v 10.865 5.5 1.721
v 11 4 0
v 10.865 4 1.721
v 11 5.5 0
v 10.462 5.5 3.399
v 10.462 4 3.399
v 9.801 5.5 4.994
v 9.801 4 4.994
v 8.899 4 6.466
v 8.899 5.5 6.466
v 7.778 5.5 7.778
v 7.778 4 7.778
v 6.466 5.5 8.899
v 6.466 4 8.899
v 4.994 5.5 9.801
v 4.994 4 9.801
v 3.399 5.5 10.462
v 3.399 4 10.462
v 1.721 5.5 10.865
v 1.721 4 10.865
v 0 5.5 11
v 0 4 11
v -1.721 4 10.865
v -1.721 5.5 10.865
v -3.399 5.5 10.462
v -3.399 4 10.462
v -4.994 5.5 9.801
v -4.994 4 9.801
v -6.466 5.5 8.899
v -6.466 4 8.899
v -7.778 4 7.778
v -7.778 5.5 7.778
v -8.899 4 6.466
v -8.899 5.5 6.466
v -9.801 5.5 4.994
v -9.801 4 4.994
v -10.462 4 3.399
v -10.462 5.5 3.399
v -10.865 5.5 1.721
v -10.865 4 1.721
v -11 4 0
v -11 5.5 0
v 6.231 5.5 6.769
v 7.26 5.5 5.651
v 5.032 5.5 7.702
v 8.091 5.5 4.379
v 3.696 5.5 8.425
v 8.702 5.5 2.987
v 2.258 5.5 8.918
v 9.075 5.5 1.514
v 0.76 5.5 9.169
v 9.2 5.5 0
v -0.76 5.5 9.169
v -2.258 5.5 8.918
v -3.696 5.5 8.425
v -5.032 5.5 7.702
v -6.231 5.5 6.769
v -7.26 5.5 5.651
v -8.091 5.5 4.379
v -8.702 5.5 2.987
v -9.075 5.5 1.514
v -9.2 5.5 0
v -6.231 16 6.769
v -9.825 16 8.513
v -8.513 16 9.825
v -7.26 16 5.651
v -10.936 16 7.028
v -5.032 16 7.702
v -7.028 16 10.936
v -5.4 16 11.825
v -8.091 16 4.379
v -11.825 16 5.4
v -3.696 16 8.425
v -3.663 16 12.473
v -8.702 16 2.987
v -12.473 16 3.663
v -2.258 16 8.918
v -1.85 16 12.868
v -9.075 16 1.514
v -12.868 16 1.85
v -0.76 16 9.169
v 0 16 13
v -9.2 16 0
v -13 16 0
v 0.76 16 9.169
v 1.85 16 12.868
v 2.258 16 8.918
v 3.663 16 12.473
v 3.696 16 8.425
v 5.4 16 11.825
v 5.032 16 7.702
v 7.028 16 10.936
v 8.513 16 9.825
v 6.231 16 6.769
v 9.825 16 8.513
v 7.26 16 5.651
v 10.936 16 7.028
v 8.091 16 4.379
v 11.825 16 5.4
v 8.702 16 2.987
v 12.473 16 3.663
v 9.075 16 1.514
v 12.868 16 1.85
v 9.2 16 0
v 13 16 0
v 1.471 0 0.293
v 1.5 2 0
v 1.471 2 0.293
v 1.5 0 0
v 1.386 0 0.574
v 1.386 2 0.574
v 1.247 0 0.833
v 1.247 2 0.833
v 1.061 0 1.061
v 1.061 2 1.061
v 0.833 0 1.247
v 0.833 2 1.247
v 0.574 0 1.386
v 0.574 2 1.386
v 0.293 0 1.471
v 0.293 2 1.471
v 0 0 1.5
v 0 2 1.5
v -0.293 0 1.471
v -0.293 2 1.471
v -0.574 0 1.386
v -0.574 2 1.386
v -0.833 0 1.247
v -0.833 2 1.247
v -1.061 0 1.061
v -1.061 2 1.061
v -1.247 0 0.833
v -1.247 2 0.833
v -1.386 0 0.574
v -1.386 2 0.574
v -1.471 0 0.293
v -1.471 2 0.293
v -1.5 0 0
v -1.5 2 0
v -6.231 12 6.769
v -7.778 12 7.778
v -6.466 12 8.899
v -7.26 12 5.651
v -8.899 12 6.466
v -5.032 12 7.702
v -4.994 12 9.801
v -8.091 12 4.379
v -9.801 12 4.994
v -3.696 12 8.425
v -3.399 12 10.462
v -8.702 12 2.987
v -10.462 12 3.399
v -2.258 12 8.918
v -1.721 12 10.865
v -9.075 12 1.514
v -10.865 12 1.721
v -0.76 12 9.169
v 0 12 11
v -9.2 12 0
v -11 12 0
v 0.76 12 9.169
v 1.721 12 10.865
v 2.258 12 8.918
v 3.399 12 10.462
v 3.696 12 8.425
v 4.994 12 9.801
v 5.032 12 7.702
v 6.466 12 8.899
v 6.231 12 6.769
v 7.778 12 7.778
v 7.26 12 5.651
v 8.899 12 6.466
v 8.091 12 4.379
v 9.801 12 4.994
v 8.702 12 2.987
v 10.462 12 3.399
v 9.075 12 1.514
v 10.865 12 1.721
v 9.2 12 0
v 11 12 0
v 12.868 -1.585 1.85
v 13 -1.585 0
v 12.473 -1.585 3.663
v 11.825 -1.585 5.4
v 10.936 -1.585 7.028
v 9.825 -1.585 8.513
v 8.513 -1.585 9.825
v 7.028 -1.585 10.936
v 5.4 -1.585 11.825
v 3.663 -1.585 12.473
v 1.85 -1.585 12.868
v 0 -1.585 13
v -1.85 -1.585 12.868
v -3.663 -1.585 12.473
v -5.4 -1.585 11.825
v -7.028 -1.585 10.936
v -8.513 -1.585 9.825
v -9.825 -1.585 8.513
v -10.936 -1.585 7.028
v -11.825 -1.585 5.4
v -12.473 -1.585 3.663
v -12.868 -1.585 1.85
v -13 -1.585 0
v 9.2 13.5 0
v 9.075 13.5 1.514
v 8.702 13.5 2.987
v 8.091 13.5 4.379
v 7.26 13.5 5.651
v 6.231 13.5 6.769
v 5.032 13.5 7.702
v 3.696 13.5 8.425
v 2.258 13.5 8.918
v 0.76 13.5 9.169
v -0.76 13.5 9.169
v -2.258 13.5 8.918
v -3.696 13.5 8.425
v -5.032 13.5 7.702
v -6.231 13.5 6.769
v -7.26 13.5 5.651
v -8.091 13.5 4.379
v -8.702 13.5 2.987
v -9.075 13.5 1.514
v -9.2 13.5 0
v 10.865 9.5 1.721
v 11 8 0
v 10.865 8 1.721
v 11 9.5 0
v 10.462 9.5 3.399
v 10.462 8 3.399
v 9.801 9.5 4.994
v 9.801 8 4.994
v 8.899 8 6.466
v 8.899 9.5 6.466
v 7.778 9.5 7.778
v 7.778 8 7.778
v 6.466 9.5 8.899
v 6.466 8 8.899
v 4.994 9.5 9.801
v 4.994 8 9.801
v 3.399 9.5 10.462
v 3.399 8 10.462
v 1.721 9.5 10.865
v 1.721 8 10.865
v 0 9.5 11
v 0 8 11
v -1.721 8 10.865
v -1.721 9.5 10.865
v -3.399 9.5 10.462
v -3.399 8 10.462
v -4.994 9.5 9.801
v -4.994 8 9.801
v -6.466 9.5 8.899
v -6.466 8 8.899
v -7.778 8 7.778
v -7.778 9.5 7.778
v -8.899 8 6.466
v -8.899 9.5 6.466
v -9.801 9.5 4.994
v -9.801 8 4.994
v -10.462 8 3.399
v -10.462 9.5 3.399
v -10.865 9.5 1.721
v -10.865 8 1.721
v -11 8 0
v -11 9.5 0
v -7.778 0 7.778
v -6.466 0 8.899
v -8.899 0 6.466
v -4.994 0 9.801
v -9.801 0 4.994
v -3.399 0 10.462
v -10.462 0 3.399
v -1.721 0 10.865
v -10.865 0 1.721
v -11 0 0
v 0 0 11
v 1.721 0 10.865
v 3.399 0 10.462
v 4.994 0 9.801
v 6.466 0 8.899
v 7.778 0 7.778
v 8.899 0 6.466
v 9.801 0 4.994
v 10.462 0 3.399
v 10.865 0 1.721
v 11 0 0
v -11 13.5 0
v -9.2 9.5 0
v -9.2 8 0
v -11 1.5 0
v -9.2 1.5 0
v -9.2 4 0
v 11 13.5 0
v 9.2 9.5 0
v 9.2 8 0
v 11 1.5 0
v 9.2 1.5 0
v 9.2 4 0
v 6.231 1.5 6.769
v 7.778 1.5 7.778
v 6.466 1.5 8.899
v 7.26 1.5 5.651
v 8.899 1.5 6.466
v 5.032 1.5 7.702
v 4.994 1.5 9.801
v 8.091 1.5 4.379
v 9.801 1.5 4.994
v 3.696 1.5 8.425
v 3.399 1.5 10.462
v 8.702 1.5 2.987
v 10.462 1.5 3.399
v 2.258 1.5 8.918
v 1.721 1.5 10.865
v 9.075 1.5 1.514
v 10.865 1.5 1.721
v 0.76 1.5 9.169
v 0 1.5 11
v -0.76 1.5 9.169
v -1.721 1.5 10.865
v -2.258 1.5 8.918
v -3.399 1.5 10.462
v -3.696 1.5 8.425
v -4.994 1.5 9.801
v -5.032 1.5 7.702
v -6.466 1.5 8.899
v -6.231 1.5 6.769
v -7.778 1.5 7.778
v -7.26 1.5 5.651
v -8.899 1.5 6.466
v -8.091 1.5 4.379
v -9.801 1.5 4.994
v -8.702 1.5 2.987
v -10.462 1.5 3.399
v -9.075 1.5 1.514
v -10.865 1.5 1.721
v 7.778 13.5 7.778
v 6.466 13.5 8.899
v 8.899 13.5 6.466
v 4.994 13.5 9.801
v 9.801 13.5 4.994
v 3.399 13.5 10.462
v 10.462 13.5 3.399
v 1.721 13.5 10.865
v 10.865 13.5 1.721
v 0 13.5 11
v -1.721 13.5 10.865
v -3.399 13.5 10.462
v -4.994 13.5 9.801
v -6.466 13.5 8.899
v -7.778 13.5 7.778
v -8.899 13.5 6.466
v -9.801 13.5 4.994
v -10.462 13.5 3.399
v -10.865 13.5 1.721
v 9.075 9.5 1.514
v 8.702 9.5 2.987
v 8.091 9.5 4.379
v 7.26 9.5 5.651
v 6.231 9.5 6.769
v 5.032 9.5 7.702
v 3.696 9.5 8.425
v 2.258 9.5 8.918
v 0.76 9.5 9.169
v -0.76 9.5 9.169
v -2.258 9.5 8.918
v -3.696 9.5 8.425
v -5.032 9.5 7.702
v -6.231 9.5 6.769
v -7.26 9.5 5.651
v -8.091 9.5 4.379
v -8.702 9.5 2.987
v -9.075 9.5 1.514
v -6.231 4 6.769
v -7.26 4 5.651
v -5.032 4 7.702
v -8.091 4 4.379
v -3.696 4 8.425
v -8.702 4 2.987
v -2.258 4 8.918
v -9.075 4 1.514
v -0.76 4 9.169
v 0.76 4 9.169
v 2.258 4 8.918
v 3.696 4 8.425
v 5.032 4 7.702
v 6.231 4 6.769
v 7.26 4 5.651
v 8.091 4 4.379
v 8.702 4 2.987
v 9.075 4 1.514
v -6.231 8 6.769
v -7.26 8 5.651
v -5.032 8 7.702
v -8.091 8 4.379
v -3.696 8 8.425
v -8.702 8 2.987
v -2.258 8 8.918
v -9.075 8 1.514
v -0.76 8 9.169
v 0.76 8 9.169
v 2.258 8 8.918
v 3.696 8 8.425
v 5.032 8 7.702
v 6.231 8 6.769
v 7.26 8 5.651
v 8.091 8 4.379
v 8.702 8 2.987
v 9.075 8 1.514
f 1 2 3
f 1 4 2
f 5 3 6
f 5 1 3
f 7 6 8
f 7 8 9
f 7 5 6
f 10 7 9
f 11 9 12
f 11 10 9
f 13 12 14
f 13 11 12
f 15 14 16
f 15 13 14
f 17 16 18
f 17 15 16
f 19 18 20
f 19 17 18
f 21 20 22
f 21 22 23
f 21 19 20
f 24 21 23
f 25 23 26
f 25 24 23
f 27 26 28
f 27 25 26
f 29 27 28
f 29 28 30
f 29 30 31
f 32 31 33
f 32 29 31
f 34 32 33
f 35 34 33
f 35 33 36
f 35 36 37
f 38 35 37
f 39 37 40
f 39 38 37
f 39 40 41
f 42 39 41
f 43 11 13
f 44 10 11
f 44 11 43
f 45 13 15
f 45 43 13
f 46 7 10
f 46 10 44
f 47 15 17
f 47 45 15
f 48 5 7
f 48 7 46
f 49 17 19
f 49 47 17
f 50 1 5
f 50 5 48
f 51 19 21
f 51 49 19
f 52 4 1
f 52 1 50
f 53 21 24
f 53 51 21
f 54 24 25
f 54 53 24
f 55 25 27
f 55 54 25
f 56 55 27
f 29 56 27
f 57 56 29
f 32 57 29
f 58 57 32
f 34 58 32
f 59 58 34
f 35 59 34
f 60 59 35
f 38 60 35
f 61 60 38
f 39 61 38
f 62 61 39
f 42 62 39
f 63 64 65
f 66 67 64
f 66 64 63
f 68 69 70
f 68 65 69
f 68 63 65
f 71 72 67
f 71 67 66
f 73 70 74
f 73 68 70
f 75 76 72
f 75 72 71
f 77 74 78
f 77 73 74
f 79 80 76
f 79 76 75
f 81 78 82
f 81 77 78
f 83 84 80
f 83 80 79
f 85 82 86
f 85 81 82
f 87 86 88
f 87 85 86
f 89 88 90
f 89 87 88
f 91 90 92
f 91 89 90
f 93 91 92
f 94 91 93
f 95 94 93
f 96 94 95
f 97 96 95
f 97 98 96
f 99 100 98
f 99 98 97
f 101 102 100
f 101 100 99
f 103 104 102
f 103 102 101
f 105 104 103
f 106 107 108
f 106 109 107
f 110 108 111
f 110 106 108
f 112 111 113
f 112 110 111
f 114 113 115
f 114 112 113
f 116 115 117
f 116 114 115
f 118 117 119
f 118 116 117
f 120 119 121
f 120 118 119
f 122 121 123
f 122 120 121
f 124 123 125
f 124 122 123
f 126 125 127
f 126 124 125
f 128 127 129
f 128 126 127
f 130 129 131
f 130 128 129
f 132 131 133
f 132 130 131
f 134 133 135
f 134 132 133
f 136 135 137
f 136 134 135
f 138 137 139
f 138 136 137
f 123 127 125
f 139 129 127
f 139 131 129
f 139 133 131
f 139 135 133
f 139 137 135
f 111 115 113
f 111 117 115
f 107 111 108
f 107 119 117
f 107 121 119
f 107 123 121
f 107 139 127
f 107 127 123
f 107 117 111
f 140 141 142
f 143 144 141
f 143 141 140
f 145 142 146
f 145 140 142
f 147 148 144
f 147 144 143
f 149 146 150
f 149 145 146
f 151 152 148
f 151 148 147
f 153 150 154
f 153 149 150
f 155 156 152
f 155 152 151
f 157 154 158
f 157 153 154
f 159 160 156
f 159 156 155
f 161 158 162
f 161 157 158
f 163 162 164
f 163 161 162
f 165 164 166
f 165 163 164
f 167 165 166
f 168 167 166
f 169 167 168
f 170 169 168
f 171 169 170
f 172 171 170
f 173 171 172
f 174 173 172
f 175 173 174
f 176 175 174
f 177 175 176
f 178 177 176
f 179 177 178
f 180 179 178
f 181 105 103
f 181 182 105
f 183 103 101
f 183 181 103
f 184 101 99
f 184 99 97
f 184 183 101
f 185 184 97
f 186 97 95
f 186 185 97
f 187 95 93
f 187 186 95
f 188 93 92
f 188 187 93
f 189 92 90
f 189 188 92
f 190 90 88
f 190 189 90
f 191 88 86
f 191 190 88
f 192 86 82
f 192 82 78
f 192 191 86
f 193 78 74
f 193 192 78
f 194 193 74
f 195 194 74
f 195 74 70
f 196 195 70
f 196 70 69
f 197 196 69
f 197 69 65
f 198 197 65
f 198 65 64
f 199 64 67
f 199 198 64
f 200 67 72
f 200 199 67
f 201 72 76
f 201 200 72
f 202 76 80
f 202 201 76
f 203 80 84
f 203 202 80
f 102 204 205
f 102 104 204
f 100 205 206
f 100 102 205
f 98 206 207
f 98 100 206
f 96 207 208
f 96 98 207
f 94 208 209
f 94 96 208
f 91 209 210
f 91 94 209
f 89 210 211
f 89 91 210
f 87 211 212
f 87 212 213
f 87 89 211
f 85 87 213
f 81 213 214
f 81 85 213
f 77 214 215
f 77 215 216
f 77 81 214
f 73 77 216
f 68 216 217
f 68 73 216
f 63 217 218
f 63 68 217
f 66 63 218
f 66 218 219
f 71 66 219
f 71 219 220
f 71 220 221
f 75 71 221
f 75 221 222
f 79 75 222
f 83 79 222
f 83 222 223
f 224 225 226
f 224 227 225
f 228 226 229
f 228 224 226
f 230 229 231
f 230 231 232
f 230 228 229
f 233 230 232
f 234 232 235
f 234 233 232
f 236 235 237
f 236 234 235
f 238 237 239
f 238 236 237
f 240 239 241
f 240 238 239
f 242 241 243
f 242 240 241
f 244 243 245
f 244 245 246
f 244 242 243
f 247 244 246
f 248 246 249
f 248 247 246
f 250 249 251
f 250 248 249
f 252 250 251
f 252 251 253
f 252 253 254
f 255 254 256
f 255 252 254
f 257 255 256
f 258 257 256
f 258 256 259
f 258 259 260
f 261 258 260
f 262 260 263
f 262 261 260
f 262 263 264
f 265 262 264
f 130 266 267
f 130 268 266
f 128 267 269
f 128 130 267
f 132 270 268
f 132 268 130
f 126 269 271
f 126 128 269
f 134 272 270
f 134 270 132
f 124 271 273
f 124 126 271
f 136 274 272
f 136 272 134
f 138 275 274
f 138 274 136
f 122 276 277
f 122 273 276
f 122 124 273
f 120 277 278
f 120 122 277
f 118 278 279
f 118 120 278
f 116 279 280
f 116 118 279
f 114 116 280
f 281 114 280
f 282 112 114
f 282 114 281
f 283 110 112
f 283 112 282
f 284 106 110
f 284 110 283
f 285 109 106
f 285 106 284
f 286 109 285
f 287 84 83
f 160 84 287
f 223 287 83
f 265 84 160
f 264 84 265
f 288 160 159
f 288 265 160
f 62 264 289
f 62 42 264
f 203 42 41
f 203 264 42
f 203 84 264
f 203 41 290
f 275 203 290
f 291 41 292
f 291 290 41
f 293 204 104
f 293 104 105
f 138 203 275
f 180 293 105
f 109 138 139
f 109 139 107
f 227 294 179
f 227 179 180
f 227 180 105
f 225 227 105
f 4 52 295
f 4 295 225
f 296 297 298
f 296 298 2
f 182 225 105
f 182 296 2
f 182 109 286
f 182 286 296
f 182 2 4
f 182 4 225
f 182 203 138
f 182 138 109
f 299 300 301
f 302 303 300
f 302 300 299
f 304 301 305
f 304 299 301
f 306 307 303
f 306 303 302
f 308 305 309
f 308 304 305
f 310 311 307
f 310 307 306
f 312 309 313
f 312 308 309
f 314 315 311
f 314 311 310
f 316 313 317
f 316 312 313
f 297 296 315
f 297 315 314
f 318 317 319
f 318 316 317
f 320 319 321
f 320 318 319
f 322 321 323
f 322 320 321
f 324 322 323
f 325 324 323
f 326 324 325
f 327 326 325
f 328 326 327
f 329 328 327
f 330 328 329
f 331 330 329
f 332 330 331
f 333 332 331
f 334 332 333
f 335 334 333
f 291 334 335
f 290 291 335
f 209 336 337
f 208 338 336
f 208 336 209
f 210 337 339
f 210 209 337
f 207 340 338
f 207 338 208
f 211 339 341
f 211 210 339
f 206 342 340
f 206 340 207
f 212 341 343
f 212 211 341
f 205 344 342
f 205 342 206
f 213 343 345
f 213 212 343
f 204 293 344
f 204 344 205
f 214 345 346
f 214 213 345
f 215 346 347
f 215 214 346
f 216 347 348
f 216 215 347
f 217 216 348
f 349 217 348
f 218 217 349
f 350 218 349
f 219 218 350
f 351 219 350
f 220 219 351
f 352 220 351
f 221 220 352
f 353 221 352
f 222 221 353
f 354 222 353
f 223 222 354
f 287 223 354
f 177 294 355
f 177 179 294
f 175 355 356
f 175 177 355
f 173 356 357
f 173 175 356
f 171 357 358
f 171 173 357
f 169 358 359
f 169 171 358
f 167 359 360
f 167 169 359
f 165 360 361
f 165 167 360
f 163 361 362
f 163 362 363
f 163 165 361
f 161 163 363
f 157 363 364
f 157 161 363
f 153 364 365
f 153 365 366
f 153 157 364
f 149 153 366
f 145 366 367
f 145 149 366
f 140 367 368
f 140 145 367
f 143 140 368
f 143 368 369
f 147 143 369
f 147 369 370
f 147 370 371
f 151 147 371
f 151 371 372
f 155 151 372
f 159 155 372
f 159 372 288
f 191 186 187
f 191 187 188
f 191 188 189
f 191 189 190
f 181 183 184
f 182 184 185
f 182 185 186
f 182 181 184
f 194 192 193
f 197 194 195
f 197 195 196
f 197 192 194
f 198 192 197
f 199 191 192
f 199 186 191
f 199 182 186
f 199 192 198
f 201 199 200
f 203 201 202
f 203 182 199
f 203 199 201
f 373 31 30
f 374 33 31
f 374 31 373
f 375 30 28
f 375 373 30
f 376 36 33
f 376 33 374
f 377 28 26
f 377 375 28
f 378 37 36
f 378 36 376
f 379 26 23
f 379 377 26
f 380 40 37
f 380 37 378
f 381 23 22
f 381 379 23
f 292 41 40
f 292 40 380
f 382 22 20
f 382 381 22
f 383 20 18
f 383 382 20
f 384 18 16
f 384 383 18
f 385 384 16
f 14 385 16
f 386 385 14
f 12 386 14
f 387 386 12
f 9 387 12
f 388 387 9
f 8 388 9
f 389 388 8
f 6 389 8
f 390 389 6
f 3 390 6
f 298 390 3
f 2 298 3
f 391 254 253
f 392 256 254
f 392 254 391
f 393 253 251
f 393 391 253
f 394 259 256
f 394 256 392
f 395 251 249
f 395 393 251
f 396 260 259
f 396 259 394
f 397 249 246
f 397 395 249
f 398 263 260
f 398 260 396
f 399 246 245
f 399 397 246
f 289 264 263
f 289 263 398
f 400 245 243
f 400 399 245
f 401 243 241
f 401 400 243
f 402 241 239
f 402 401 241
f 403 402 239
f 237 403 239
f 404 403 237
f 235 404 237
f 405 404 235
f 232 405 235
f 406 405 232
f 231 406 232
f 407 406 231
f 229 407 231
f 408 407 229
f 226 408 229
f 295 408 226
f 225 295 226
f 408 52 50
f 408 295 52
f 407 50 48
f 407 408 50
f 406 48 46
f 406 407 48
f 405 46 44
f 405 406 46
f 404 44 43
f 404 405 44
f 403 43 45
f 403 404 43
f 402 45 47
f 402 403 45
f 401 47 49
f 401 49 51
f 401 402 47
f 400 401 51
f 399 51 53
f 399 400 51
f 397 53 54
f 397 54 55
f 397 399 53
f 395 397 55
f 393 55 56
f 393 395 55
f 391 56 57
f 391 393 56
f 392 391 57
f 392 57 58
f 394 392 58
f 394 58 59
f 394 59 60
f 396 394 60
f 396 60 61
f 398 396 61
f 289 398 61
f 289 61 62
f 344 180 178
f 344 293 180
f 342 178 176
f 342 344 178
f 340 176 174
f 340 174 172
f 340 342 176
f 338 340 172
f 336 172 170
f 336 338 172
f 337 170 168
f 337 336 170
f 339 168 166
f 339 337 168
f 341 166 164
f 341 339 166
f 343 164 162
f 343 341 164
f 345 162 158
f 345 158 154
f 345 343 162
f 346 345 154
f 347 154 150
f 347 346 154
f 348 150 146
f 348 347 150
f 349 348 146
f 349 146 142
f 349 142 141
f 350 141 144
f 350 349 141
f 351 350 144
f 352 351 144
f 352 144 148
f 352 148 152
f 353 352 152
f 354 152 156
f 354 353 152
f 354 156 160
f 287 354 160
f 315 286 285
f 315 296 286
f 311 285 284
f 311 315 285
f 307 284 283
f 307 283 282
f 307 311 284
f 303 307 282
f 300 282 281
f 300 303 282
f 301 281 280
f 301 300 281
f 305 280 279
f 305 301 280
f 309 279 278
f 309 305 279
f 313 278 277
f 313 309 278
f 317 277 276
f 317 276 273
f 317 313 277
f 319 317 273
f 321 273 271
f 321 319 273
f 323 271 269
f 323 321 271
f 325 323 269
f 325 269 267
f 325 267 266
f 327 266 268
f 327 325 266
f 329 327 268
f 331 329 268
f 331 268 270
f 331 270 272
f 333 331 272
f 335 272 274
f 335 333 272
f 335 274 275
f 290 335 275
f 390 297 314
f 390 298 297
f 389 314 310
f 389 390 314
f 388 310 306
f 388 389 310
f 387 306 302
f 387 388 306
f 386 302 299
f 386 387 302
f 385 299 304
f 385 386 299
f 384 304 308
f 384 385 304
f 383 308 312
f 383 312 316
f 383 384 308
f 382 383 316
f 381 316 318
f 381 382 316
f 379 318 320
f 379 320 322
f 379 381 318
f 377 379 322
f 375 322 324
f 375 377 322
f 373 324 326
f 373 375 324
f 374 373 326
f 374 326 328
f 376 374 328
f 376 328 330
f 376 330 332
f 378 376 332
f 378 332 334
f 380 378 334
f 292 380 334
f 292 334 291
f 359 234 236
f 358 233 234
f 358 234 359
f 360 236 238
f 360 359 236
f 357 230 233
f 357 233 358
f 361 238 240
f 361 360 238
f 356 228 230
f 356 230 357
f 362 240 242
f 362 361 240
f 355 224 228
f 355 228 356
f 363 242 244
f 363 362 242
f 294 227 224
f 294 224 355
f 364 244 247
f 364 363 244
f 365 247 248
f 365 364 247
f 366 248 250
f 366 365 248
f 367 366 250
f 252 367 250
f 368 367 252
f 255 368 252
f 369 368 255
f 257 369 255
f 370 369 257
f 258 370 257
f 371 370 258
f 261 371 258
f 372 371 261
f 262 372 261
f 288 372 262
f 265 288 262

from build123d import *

# Parameters (mm, degrees)
CUT_EXTRUDE_START   = -20
CUT_EXTRUDE_1_DEPTH = 20


with BuildPart() as part:
    # 草图1 → 旋转1 (revolve)
    with BuildSketch(Plane.XY, mode=Mode.PRIVATE) as revolve_1_sk:
        Polygon((0, 2), (1.5, 2), (1.5, 0), (11, 0), (11, 1.5), (9.2, 1.5), (9.2, 4), (11, 4), (11, 5.5), (9.2, 5.5), (9.2, 8), (11, 8), (11, 9.5), (9.2, 9.5), (9.2, 12), (11, 12), (11, 13.5), (9.2, 13.5), (9.2, 16), (13, 16), (13, -1.584568421), (0, -1.584568421), (0, 0), align=None)
    revolve(revolve_1_sk.sketch.rotate(Axis((0, 18, 0), (0, -1, 0)), 180), axis=Axis((0, 18, 0), (0, -1, 0)))

    # 草图2 → 切除-拉伸1 (cut)
    with BuildSketch(Plane(origin=(0, 16, 0), x_dir=(1, 0, 0), z_dir=(0, 1, 0)).offset(CUT_EXTRUDE_START)):
        with BuildLine():
            Line((-13, 0), (13, 0))
            ThreePointArc((13, 0), (0, 13), (-13, 0))
        make_face()
    extrude(amount=CUT_EXTRUDE_1_DEPTH, mode=Mode.SUBTRACT)


solid = part.part
